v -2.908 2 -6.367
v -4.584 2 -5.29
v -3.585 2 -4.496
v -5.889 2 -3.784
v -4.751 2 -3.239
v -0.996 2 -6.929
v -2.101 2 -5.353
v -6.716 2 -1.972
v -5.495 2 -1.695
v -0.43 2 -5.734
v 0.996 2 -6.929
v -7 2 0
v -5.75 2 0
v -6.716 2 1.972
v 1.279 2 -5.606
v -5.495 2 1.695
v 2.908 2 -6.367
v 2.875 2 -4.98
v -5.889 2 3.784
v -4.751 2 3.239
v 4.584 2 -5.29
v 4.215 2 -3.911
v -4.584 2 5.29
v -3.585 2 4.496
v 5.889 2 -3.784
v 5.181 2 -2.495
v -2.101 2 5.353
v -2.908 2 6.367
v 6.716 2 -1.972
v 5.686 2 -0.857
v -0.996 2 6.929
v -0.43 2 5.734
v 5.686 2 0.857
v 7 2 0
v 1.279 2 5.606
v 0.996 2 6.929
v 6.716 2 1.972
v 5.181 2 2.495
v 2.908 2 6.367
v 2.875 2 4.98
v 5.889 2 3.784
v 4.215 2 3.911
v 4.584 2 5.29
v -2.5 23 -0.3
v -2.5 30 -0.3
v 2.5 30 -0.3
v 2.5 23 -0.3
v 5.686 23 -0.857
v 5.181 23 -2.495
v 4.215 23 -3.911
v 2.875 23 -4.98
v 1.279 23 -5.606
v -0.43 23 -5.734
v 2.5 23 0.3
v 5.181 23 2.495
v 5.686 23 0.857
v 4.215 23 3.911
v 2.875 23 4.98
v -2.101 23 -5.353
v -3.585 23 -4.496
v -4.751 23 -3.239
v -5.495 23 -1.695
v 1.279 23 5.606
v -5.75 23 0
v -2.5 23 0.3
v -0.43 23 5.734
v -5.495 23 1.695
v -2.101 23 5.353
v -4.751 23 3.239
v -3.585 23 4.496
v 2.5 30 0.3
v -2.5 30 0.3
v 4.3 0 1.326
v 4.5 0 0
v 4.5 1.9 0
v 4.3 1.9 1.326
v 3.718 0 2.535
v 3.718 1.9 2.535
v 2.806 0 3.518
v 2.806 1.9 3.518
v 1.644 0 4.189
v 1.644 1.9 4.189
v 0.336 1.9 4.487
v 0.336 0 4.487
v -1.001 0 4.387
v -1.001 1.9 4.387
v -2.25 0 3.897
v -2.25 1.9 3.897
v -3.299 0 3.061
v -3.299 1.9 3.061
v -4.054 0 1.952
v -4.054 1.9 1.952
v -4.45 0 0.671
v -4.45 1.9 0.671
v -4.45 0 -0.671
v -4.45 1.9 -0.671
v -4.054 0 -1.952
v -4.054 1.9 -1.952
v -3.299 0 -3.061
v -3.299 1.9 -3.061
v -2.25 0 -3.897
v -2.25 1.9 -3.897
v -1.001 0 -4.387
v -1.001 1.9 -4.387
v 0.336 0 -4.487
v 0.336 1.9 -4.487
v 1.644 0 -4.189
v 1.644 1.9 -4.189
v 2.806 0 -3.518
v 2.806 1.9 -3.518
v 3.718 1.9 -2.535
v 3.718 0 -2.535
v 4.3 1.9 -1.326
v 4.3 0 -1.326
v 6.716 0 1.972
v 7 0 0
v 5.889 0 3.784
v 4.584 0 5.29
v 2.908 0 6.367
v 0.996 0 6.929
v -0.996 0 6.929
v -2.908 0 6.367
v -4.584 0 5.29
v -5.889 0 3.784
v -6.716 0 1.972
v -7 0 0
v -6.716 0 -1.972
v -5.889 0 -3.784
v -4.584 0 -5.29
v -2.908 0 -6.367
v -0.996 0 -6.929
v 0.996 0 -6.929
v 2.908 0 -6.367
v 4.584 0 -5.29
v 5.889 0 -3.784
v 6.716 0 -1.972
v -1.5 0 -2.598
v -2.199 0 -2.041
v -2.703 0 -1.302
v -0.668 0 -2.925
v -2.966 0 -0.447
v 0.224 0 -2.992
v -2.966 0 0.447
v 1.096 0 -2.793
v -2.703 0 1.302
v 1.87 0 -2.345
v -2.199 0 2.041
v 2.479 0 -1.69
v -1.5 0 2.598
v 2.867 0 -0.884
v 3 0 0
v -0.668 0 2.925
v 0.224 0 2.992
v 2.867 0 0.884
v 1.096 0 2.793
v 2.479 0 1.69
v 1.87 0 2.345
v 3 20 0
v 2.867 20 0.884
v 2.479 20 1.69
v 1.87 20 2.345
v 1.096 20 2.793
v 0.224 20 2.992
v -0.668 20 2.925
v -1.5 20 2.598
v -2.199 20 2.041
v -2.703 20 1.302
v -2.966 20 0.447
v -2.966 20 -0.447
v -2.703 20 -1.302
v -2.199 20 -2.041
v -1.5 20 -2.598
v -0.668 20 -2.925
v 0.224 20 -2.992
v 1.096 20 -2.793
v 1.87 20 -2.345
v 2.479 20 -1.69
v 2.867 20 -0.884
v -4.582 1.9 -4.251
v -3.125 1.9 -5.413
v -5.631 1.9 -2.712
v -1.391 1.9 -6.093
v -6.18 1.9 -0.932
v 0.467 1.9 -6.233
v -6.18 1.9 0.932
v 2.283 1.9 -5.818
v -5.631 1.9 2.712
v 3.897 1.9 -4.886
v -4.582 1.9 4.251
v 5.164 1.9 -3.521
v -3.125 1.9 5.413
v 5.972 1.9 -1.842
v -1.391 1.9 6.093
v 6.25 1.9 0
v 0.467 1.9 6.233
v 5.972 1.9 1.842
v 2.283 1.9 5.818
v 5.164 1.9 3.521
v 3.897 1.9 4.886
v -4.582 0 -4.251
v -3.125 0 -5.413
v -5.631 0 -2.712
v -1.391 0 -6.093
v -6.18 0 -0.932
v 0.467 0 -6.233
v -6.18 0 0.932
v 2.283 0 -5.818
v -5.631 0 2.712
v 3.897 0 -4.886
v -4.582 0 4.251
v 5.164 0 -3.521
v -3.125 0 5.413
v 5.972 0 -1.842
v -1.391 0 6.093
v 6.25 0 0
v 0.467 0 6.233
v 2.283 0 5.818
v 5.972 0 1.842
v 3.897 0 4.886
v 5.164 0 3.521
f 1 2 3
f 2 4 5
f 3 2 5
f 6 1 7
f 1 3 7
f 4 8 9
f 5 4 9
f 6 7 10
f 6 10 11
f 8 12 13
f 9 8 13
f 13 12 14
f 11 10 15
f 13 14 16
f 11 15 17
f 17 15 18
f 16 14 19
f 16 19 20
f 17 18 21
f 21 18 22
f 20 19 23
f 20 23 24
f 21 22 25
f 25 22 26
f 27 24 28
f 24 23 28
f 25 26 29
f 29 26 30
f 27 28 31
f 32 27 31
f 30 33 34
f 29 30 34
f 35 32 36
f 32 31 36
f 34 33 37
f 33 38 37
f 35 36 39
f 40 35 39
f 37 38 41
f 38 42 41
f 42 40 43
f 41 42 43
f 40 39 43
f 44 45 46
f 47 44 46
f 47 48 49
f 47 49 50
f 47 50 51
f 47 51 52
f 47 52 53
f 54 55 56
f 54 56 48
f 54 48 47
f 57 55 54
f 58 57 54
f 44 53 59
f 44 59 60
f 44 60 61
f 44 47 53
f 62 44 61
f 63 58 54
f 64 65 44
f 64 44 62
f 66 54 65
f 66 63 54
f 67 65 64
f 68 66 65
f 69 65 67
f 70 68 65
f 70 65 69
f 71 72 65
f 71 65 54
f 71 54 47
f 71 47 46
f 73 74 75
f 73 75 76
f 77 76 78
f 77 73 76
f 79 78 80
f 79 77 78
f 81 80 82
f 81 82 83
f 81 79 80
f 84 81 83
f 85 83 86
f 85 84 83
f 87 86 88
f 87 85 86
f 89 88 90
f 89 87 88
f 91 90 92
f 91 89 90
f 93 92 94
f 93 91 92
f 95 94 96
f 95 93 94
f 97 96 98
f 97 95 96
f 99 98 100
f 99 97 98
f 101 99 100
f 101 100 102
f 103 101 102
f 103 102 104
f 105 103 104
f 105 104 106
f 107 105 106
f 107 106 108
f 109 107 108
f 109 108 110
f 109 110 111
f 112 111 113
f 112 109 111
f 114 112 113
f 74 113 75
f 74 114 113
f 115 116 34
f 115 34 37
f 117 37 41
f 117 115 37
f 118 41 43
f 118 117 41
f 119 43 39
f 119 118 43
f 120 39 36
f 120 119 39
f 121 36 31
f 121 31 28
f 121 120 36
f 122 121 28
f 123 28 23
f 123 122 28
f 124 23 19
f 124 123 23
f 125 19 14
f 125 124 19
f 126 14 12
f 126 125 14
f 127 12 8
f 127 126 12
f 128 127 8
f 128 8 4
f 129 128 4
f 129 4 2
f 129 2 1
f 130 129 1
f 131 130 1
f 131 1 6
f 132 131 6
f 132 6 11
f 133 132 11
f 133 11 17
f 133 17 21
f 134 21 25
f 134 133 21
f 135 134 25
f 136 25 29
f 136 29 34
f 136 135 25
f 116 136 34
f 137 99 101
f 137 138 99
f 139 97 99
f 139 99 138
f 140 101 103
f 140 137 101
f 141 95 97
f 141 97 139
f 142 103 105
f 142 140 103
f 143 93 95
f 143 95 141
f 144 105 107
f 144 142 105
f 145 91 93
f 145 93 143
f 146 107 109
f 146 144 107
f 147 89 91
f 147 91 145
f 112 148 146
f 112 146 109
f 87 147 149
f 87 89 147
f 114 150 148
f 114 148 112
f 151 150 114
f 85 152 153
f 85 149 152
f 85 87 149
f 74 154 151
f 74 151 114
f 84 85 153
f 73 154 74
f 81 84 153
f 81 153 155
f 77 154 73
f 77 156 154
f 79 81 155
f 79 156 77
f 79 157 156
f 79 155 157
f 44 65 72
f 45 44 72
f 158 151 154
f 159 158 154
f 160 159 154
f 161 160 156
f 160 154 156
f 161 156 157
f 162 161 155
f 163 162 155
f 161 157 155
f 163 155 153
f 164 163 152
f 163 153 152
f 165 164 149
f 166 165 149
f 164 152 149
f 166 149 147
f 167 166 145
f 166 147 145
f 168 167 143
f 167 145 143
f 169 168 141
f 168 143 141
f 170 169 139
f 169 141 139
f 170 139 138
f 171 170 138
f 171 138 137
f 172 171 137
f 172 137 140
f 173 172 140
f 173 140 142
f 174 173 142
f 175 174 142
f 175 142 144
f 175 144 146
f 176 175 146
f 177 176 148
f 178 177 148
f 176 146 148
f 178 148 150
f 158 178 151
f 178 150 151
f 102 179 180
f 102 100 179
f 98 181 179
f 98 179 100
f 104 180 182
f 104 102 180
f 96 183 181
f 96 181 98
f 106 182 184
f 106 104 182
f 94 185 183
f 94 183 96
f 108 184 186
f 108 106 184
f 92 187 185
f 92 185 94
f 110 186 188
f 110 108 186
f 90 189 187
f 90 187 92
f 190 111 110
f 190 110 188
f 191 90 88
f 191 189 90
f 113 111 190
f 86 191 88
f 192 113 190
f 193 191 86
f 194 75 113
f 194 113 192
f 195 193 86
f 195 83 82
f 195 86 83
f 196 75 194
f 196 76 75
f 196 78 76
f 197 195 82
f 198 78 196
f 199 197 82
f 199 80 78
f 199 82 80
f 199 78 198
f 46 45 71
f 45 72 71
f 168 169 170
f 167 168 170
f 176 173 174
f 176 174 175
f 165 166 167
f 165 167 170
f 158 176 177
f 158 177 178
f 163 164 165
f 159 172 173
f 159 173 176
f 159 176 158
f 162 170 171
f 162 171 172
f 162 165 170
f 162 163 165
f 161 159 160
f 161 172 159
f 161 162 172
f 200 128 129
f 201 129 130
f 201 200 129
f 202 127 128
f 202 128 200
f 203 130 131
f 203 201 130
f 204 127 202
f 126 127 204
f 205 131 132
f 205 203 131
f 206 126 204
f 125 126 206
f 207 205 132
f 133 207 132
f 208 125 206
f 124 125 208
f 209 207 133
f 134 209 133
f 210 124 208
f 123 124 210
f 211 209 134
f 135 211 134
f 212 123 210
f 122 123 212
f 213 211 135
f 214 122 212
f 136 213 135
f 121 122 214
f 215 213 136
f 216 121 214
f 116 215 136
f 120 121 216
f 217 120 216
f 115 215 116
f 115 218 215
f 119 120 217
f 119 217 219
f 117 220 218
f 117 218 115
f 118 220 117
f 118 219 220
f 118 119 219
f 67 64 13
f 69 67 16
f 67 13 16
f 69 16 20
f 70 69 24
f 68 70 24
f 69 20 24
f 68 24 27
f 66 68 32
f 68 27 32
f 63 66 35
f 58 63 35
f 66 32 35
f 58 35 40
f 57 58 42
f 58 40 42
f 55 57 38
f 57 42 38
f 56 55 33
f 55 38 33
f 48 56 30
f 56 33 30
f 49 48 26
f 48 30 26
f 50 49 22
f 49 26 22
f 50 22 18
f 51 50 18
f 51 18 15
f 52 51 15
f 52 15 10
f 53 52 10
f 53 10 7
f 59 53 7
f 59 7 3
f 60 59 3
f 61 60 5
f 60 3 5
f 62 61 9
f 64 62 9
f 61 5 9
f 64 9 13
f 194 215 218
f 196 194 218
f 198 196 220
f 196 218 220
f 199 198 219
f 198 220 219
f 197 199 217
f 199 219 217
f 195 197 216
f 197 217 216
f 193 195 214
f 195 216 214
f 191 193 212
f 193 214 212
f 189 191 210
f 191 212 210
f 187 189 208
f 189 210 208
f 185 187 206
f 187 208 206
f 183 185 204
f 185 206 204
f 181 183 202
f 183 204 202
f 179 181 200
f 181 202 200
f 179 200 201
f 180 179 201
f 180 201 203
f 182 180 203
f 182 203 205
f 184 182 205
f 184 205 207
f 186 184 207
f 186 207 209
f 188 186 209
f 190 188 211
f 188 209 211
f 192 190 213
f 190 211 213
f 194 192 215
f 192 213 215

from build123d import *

# Parameters (mm, degrees)
F0_R     = 7
F1_DEPTH = 2
F2_R     = 5.75
F3_DEPTH = 21
F4_R     = 3
F5_DEPTH = 20
F6_R     = 6.25
F6_R_2   = 4.5
F7_DEPTH = 1.9
F8_W     = 5
F8_H     = 8
F9_DEPTH = 0.3


with BuildPart() as f1:
    # F0 (on Front) → F1 (new body)
    with BuildSketch(Plane.XZ):
        Circle(F0_R)
    extrude(amount=-F1_DEPTH)

    # F2 (on face) → F3 (join)
    with BuildSketch(Plane(origin=(0, 2, 0), x_dir=(-1, 0, 0), z_dir=(0, 1, 0))):
        Circle(F2_R)
    extrude(amount=F3_DEPTH)

    # F4 (on face) → F5 (cut)
    with BuildSketch(Plane.XZ):
        Circle(F4_R)
    extrude(amount=-F5_DEPTH, mode=Mode.SUBTRACT)

    # F6 (on face) → F7 (cut)
    with BuildSketch(Plane.XZ):
        Circle(F6_R)
        Circle(F6_R_2, mode=Mode.SUBTRACT)
    extrude(amount=-F7_DEPTH, mode=Mode.SUBTRACT)

    # F8 (on Top) → F9 (join, symmetric)
    with BuildSketch(Plane.XY):
        with Locations((0, 26)):
            Rectangle(F8_W, F8_H)
    extrude(amount=F9_DEPTH, both=True)


solid = f1.part
